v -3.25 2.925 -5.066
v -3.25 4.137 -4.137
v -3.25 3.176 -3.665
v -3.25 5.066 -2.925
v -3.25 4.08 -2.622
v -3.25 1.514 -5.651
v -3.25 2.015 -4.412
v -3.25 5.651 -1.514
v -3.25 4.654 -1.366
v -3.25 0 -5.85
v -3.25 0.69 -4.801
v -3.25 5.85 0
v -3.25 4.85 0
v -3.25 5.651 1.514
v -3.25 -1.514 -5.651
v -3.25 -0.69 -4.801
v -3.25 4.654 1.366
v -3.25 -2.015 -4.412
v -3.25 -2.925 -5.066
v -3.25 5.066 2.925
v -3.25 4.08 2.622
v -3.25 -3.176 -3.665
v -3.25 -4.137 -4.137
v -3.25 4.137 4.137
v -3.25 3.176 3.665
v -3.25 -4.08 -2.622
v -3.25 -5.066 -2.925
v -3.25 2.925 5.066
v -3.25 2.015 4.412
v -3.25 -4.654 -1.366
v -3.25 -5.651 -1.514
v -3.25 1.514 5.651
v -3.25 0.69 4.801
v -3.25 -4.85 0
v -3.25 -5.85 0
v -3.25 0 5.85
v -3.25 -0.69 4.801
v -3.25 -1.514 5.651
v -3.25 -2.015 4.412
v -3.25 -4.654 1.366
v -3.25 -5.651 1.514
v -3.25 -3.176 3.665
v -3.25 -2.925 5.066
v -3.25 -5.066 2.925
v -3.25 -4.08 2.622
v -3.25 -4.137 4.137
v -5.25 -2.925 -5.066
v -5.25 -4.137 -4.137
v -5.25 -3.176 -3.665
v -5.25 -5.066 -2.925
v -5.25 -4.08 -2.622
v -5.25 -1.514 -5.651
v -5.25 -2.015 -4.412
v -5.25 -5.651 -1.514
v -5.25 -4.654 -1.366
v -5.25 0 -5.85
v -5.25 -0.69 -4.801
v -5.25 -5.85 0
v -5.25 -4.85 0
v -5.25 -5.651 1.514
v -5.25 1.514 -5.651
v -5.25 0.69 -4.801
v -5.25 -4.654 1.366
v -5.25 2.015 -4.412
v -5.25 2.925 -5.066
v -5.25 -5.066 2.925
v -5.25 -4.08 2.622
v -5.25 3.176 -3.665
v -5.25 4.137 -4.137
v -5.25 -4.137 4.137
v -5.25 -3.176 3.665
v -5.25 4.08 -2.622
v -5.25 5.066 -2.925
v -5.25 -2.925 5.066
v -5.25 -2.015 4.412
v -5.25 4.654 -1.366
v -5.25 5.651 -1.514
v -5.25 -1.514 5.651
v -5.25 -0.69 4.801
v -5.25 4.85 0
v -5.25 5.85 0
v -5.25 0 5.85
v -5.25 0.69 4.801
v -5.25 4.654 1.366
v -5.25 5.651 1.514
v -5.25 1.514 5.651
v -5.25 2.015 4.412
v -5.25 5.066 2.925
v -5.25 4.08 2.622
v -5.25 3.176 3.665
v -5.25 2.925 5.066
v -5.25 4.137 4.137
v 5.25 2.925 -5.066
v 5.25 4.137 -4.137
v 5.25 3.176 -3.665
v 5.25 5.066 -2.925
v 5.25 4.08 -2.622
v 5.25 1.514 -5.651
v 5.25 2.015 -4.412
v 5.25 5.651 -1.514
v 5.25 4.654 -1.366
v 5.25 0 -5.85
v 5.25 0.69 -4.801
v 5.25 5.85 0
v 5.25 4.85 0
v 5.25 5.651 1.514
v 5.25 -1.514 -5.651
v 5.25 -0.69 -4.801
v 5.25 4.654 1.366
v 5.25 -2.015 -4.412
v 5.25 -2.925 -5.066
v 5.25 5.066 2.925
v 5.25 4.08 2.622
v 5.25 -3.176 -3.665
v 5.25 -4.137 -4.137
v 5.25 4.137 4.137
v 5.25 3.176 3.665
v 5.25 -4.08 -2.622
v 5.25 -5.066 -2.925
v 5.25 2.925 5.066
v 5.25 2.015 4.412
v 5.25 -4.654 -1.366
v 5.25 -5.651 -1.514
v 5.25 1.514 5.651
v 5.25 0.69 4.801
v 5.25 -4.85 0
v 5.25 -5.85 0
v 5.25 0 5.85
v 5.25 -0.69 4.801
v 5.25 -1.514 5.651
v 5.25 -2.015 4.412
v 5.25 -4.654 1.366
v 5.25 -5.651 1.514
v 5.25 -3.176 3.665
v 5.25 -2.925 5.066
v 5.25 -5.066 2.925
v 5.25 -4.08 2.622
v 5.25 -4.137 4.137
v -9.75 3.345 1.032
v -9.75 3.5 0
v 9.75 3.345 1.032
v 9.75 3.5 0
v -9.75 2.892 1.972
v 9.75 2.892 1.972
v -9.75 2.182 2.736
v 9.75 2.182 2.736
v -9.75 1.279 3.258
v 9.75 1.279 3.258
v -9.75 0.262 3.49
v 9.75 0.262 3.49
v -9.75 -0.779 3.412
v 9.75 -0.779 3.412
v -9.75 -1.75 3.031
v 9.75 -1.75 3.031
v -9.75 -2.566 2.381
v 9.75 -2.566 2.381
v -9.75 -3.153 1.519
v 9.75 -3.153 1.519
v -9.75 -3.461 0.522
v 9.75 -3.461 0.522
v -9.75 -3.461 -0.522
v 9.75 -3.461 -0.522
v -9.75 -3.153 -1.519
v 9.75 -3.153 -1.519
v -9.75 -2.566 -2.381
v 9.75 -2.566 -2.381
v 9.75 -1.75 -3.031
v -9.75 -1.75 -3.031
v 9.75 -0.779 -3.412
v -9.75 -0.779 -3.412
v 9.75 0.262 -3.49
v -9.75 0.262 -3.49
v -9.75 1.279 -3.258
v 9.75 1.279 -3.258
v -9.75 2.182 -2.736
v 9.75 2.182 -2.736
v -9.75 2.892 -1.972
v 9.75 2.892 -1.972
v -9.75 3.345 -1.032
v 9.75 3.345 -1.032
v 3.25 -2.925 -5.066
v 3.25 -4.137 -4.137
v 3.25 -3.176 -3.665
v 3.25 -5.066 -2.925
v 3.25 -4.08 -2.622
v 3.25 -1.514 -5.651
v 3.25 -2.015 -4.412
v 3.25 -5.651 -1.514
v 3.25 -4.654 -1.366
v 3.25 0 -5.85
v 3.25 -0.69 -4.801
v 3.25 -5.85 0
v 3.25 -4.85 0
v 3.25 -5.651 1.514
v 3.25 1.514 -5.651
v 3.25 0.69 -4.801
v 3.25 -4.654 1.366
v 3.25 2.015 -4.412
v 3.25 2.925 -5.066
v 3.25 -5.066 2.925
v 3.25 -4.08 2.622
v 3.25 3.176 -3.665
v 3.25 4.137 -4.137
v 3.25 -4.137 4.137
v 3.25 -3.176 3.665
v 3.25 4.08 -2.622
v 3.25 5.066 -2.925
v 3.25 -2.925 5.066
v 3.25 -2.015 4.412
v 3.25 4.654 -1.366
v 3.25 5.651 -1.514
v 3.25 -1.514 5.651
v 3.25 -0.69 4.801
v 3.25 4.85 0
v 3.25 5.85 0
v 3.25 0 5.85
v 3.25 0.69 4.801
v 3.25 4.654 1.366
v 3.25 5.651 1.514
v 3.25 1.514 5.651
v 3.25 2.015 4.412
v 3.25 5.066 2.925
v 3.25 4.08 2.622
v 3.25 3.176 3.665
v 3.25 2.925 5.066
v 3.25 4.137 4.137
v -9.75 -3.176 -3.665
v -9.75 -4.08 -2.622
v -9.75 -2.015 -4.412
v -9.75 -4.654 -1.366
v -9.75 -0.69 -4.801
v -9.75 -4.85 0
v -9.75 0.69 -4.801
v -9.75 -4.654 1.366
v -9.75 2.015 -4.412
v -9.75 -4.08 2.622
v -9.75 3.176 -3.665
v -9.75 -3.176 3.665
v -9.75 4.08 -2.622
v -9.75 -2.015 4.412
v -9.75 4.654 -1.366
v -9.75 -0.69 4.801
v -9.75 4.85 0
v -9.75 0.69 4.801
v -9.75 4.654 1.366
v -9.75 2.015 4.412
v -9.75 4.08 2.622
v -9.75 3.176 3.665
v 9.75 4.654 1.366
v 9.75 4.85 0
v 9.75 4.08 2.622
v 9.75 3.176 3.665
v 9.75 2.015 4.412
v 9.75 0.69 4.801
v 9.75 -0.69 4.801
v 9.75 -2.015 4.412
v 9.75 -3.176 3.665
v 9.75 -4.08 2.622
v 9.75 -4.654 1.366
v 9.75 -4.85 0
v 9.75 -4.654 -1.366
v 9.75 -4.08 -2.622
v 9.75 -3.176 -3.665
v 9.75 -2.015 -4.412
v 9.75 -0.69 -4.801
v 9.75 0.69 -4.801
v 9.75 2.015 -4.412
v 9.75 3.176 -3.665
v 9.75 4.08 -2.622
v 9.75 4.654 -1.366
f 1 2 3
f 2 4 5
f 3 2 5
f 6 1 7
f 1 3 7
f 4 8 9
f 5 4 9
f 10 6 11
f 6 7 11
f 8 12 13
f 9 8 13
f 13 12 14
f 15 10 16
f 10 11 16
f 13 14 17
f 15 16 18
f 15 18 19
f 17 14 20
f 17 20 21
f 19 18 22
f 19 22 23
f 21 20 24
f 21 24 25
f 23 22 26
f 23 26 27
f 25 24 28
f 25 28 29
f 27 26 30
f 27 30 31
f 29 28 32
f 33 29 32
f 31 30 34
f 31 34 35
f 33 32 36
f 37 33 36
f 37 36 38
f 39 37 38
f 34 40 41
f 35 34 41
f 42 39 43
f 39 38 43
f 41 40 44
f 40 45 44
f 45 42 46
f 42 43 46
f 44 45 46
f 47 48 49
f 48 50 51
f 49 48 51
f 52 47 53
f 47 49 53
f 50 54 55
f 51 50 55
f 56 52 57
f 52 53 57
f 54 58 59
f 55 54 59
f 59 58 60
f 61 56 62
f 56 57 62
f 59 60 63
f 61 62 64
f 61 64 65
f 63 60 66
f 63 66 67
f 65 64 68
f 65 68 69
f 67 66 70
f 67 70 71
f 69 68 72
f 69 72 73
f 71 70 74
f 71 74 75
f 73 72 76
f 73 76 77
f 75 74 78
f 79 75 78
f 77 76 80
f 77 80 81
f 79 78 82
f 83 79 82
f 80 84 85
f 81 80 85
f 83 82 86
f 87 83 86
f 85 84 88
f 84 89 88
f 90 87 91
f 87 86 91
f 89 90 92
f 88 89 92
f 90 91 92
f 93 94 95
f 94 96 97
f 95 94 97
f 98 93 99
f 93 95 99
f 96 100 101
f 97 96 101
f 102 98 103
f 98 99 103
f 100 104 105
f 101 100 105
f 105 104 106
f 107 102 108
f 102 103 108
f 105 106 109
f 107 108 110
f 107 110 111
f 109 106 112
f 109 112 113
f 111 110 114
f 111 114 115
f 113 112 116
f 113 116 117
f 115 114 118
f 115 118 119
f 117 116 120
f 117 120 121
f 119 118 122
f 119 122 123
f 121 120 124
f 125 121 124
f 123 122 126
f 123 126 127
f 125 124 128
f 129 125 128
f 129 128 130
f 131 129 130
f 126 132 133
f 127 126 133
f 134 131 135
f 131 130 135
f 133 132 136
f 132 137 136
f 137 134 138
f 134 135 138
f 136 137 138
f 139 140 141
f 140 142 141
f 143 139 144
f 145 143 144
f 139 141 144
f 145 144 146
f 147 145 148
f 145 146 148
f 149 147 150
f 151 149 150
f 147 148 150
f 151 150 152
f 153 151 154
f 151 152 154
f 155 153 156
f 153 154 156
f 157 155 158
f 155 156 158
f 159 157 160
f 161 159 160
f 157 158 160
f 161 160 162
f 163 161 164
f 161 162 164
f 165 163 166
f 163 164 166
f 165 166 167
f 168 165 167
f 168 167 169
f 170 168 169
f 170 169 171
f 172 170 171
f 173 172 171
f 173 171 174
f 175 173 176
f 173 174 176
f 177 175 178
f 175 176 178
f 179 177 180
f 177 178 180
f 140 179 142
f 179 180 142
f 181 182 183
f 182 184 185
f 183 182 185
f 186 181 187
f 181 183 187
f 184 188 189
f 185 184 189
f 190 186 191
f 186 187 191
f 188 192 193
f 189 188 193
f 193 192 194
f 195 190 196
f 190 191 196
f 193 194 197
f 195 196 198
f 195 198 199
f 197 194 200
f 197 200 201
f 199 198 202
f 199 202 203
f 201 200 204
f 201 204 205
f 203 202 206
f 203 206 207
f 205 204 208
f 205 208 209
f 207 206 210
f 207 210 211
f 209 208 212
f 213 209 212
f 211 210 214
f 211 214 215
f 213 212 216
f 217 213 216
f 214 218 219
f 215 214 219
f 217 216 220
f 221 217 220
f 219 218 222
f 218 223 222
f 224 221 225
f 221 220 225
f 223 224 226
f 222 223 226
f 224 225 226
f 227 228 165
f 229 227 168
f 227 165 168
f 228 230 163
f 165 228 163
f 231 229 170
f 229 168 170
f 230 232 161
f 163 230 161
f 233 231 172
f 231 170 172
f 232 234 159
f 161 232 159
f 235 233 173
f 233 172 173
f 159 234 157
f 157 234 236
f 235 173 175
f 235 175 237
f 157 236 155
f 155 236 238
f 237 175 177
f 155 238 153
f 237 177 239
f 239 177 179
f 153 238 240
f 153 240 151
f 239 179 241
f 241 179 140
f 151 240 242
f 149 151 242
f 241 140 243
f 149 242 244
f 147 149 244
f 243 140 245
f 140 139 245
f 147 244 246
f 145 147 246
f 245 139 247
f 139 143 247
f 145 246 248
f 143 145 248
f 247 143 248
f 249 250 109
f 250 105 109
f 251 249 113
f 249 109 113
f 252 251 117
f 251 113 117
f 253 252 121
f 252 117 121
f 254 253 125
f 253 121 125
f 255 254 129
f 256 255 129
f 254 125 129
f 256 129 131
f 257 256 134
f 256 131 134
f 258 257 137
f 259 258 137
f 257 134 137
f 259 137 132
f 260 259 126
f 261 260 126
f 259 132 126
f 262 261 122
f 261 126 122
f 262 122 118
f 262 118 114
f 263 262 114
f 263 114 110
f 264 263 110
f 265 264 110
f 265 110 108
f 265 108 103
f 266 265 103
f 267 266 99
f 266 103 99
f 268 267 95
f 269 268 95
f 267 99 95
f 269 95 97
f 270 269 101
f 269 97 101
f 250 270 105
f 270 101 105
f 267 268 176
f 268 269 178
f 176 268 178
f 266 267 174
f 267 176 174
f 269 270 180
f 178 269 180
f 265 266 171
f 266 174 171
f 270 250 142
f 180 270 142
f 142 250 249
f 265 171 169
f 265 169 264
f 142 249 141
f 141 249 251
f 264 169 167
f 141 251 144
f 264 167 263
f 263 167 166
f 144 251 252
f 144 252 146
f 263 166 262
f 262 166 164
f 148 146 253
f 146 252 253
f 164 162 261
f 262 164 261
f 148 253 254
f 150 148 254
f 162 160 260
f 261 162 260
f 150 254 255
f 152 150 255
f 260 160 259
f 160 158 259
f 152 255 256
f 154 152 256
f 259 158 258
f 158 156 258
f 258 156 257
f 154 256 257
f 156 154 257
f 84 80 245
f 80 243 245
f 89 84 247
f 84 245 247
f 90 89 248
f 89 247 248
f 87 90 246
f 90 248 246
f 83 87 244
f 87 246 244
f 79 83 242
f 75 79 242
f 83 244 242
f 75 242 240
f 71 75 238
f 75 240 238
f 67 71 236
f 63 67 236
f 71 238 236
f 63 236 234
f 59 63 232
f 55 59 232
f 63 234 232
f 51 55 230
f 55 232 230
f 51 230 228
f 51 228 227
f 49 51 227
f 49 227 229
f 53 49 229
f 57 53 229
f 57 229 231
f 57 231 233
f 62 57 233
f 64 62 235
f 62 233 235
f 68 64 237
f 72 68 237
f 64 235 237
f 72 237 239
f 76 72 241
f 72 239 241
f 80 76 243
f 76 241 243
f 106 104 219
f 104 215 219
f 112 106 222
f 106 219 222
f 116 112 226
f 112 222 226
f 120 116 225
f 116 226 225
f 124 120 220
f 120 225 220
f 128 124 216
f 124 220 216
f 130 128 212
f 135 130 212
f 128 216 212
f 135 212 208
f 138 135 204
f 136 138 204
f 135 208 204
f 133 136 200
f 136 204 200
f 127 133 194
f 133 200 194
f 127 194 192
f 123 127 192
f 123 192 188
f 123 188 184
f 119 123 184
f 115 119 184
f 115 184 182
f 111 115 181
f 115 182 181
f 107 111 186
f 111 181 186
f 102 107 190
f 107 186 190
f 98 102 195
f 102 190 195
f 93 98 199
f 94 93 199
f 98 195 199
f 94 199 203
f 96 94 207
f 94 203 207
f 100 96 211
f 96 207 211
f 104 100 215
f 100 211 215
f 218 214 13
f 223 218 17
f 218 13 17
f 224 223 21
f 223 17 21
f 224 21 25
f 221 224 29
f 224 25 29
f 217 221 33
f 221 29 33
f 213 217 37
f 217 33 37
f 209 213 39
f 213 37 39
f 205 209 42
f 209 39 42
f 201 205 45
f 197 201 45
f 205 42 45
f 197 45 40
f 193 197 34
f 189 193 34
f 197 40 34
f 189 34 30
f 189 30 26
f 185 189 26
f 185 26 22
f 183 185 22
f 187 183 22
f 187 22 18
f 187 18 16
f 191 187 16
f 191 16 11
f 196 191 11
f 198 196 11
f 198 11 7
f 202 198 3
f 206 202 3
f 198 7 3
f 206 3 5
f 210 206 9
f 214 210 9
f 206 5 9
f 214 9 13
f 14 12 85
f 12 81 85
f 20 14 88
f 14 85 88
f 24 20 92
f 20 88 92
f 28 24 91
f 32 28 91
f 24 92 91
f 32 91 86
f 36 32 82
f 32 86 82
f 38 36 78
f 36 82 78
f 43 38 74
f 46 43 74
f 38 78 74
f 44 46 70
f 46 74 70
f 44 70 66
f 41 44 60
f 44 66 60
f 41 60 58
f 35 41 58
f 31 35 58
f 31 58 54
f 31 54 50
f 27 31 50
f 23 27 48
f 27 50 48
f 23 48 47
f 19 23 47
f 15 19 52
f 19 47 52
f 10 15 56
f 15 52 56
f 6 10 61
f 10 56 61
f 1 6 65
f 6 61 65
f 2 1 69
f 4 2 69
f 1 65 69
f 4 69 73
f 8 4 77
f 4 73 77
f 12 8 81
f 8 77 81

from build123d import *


with BuildPart() as part:
    # Skica1 → Rotovat1 (revolve)
    with BuildSketch(Plane.XY):
        Polygon((0, 3.5), (9.75, 3.5), (9.75, 4.85), (5.25, 4.85), (5.25, 5.85), (3.25, 5.85), (3.25, 4.85), (-3.25, 4.85), (-3.25, 5.85), (-5.25, 5.85), (-5.25, 4.85), (-9.75, 4.85), (-9.75, 3.5), align=None)
    revolve(axis=Axis((0, 0, 0), (1, 0, 0)))


solid = part.part
